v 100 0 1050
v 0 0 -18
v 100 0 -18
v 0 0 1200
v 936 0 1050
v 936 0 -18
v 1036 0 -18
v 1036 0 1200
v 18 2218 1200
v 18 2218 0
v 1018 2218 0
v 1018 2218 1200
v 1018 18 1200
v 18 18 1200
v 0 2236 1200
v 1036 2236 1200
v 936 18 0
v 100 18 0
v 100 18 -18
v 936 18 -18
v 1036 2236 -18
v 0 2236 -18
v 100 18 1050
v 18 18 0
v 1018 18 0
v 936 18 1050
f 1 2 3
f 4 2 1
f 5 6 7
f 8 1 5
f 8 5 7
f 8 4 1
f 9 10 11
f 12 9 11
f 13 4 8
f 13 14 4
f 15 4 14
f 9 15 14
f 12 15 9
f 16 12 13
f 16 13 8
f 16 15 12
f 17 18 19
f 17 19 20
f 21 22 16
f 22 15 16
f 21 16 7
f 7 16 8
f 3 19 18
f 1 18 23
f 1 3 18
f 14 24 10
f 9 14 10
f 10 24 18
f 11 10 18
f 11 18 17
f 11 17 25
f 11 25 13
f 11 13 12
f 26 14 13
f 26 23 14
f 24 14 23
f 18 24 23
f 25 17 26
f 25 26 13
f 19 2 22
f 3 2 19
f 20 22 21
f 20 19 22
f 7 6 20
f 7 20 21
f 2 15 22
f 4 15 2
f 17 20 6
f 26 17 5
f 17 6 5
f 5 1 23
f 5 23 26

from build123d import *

# Parameters (mm, degrees)
F0_W     = 1036
F0_H     = 2236
F0_W_2   = 1000
F0_H_2   = 2200
F1_DEPTH = 1200
F2_W     = 1036
F2_H     = 2236
F3_DEPTH = 18
F4_W     = 836
F4_H     = 1068
F5_DEPTH = 18


with BuildPart() as f1:
    # F0 (on Top) → F1 (new body)
    with BuildSketch(Plane.XY):
        with Locations((518, 1118)):
            Rectangle(F0_W, F0_H)
        with Locations((518, 1118)):
            Rectangle(F0_W_2, F0_H_2, mode=Mode.SUBTRACT)
    extrude(amount=F1_DEPTH)

    # F2 (on face) → F3 (join)
    with BuildSketch(Plane(origin=(0, 0, 0), x_dir=(1, 0, 0), z_dir=(0, 0, -1))):
        with Locations((518, -1118)):
            Rectangle(F2_W, F2_H)
    extrude(amount=F3_DEPTH)

    # F4 (on face) → F5 (cut)
    with BuildSketch(Plane.XZ):
        with Locations((518, 516)):
            Rectangle(F4_W, F4_H)
    extrude(amount=-F5_DEPTH, mode=Mode.SUBTRACT)


solid = f1.part
